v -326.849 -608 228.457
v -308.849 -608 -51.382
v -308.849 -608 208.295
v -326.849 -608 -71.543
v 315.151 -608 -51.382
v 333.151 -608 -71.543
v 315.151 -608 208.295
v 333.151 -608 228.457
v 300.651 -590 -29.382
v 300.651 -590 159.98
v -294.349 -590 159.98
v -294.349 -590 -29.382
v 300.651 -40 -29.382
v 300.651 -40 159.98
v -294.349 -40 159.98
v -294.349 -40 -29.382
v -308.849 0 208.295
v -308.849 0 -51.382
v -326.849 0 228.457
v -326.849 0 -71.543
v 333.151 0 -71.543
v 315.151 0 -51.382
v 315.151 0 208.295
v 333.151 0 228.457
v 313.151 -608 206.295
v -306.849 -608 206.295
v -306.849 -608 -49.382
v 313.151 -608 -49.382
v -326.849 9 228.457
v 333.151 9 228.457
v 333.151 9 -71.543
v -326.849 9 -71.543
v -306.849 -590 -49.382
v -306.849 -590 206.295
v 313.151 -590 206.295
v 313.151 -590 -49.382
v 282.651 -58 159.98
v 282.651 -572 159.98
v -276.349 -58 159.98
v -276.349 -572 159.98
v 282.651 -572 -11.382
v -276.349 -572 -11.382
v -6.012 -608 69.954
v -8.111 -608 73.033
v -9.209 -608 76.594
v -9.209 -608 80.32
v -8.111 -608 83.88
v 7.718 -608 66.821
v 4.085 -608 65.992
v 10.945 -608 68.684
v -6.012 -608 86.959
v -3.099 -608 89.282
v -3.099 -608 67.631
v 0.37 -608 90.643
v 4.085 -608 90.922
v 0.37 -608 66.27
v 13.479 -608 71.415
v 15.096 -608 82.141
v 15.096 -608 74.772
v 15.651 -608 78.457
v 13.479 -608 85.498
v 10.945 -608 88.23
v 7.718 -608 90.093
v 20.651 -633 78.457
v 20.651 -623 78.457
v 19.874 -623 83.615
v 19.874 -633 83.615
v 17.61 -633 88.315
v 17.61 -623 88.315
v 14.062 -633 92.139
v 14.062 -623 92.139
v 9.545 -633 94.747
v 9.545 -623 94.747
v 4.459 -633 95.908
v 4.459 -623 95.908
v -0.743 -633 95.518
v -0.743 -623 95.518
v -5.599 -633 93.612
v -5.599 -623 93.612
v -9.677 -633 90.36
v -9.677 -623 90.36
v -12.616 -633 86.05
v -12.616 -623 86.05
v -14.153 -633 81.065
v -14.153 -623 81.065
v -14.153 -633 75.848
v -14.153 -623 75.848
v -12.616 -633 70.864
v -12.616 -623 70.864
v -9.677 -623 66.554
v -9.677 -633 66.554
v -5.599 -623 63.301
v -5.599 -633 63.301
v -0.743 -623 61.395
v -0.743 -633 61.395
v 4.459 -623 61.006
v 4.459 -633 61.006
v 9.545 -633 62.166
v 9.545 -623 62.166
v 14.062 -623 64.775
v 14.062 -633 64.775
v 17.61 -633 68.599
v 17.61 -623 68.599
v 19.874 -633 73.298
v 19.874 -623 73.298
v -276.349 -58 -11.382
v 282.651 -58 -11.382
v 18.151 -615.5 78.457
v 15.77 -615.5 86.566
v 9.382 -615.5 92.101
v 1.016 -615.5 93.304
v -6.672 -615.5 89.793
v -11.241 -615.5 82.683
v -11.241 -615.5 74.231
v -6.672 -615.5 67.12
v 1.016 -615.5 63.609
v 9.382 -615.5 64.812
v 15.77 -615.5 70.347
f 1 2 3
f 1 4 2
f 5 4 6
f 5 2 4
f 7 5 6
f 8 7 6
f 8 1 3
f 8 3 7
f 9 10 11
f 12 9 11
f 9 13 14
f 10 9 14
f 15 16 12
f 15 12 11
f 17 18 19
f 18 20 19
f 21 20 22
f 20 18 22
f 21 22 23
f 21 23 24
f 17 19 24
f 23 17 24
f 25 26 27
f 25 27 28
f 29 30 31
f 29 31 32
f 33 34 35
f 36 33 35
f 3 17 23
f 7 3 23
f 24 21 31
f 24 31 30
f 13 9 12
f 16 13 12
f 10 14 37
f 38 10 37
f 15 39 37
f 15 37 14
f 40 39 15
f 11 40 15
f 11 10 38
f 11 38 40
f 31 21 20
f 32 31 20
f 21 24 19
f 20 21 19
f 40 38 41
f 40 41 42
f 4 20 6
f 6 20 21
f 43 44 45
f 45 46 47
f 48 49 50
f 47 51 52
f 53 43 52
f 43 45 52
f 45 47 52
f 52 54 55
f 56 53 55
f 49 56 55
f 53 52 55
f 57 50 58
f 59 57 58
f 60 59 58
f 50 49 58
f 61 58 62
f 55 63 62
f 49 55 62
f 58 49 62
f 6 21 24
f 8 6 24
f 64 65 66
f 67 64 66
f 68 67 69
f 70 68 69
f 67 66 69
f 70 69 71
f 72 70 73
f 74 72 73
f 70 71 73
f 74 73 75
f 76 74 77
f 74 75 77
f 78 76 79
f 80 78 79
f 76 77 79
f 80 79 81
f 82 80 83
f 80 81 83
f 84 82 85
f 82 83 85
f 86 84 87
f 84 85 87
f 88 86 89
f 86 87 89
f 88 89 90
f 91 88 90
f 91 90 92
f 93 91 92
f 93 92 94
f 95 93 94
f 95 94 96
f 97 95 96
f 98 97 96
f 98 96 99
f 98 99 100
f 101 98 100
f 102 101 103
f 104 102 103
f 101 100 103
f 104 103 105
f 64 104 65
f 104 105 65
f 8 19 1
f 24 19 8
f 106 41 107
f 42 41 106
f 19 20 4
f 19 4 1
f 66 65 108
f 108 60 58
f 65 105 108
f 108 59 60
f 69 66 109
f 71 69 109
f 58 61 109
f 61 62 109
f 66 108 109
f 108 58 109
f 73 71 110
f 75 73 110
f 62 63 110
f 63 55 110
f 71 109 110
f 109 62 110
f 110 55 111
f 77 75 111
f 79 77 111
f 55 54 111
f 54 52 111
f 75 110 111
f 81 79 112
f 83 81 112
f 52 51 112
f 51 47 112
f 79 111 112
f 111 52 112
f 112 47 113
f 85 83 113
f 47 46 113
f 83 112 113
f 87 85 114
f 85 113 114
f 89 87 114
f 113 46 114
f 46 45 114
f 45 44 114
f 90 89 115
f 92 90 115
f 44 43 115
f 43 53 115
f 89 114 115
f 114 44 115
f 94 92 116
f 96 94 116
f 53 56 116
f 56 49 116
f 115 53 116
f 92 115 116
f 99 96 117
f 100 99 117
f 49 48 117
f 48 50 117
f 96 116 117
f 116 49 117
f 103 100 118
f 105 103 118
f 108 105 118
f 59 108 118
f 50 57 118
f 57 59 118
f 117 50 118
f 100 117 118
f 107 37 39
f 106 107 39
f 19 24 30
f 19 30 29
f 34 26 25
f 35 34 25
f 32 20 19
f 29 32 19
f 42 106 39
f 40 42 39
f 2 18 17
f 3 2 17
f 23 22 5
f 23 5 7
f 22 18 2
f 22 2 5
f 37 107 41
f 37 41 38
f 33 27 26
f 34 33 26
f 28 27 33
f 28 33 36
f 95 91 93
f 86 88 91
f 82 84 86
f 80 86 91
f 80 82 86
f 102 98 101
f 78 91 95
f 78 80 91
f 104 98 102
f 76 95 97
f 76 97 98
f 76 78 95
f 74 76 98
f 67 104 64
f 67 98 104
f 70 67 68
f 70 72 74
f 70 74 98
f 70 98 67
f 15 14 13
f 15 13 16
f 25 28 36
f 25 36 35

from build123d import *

# Parameters (mm, degrees)
F0_W      = 660
F0_H      = 300
F0_W_2    = 624
F0_H_2    = 259.677094
F1_DEPTH  = 608
F2_W      = 660
F2_H      = 300
F3_DEPTH  = 9
F4_W      = 620
F4_H      = 255.677094
F5_DEPTH  = 18
F6_W      = 595
F6_H      = 189.362255
F7_DEPTH  = 550
F8_T      = -18
F9_R      = 17.5
F10_DEPTH = 25
F11_SIZE2 = 5
F11_SIZE  = 15


with BuildPart() as f1:
    # F0 (on Front) → F1 (new body)
    with BuildSketch(Plane.XZ):
        with Locations((3.151048, 78.456648)):
            Rectangle(F0_W, F0_H)
        with Locations((3.151048, 78.456648)):
            Rectangle(F0_W_2, F0_H_2, mode=Mode.SUBTRACT)
    extrude(amount=F1_DEPTH)


with BuildPart() as f3:
    # F2 (on face) → F3 (new body)
    with BuildSketch(Plane(origin=(0, 0, 0), x_dir=(-1, 0, 0), z_dir=(0, 1, 0))):
        with Locations((-3.151048, 78.456648)):
            Rectangle(F2_W, F2_H)
    extrude(amount=F3_DEPTH)


with BuildPart() as f5:
    # F4 (on face) → F5 (new body)
    with BuildSketch(Plane.XZ.offset(608)):
        with Locations((3.151048, 78.456648)):
            Rectangle(F4_W, F4_H)
    extrude(amount=-F5_DEPTH)


with BuildPart() as f7:
    # F6 (on face) → F7 (new body)
    with BuildSketch(Plane(origin=(0, -590, 0), x_dir=(-1, 0, 0), z_dir=(0, 1, 0))):
        with Locations((-3.151048, 65.299228)):
            Rectangle(F6_W, F6_H)
    extrude(amount=F7_DEPTH)

    # F8
    f8_openings = [f7.faces().sort_by_distance(p)[0] for p in [
        (3.151048, -315, 159.980356),
    ]]
    offset(amount=F8_T, openings=f8_openings)


with BuildPart() as f10:
    # F9 (on face) → F10 (new body)
    with BuildSketch(Plane.XZ.offset(608)):
        with Locations((3.151048, 78.456648)):
            Circle(F9_R)
    extrude(amount=F10_DEPTH)

    # F11
    f11_edges = [f10.edges().sort_by_distance(p)[0] for p in [
        (-14.348952, -608, 78.456648),
    ]]
    chamfer(f11_edges, length=F11_SIZE, length2=F11_SIZE2)


solid = Compound([f1.part, f3.part, f5.part, f7.part, f10.part])
